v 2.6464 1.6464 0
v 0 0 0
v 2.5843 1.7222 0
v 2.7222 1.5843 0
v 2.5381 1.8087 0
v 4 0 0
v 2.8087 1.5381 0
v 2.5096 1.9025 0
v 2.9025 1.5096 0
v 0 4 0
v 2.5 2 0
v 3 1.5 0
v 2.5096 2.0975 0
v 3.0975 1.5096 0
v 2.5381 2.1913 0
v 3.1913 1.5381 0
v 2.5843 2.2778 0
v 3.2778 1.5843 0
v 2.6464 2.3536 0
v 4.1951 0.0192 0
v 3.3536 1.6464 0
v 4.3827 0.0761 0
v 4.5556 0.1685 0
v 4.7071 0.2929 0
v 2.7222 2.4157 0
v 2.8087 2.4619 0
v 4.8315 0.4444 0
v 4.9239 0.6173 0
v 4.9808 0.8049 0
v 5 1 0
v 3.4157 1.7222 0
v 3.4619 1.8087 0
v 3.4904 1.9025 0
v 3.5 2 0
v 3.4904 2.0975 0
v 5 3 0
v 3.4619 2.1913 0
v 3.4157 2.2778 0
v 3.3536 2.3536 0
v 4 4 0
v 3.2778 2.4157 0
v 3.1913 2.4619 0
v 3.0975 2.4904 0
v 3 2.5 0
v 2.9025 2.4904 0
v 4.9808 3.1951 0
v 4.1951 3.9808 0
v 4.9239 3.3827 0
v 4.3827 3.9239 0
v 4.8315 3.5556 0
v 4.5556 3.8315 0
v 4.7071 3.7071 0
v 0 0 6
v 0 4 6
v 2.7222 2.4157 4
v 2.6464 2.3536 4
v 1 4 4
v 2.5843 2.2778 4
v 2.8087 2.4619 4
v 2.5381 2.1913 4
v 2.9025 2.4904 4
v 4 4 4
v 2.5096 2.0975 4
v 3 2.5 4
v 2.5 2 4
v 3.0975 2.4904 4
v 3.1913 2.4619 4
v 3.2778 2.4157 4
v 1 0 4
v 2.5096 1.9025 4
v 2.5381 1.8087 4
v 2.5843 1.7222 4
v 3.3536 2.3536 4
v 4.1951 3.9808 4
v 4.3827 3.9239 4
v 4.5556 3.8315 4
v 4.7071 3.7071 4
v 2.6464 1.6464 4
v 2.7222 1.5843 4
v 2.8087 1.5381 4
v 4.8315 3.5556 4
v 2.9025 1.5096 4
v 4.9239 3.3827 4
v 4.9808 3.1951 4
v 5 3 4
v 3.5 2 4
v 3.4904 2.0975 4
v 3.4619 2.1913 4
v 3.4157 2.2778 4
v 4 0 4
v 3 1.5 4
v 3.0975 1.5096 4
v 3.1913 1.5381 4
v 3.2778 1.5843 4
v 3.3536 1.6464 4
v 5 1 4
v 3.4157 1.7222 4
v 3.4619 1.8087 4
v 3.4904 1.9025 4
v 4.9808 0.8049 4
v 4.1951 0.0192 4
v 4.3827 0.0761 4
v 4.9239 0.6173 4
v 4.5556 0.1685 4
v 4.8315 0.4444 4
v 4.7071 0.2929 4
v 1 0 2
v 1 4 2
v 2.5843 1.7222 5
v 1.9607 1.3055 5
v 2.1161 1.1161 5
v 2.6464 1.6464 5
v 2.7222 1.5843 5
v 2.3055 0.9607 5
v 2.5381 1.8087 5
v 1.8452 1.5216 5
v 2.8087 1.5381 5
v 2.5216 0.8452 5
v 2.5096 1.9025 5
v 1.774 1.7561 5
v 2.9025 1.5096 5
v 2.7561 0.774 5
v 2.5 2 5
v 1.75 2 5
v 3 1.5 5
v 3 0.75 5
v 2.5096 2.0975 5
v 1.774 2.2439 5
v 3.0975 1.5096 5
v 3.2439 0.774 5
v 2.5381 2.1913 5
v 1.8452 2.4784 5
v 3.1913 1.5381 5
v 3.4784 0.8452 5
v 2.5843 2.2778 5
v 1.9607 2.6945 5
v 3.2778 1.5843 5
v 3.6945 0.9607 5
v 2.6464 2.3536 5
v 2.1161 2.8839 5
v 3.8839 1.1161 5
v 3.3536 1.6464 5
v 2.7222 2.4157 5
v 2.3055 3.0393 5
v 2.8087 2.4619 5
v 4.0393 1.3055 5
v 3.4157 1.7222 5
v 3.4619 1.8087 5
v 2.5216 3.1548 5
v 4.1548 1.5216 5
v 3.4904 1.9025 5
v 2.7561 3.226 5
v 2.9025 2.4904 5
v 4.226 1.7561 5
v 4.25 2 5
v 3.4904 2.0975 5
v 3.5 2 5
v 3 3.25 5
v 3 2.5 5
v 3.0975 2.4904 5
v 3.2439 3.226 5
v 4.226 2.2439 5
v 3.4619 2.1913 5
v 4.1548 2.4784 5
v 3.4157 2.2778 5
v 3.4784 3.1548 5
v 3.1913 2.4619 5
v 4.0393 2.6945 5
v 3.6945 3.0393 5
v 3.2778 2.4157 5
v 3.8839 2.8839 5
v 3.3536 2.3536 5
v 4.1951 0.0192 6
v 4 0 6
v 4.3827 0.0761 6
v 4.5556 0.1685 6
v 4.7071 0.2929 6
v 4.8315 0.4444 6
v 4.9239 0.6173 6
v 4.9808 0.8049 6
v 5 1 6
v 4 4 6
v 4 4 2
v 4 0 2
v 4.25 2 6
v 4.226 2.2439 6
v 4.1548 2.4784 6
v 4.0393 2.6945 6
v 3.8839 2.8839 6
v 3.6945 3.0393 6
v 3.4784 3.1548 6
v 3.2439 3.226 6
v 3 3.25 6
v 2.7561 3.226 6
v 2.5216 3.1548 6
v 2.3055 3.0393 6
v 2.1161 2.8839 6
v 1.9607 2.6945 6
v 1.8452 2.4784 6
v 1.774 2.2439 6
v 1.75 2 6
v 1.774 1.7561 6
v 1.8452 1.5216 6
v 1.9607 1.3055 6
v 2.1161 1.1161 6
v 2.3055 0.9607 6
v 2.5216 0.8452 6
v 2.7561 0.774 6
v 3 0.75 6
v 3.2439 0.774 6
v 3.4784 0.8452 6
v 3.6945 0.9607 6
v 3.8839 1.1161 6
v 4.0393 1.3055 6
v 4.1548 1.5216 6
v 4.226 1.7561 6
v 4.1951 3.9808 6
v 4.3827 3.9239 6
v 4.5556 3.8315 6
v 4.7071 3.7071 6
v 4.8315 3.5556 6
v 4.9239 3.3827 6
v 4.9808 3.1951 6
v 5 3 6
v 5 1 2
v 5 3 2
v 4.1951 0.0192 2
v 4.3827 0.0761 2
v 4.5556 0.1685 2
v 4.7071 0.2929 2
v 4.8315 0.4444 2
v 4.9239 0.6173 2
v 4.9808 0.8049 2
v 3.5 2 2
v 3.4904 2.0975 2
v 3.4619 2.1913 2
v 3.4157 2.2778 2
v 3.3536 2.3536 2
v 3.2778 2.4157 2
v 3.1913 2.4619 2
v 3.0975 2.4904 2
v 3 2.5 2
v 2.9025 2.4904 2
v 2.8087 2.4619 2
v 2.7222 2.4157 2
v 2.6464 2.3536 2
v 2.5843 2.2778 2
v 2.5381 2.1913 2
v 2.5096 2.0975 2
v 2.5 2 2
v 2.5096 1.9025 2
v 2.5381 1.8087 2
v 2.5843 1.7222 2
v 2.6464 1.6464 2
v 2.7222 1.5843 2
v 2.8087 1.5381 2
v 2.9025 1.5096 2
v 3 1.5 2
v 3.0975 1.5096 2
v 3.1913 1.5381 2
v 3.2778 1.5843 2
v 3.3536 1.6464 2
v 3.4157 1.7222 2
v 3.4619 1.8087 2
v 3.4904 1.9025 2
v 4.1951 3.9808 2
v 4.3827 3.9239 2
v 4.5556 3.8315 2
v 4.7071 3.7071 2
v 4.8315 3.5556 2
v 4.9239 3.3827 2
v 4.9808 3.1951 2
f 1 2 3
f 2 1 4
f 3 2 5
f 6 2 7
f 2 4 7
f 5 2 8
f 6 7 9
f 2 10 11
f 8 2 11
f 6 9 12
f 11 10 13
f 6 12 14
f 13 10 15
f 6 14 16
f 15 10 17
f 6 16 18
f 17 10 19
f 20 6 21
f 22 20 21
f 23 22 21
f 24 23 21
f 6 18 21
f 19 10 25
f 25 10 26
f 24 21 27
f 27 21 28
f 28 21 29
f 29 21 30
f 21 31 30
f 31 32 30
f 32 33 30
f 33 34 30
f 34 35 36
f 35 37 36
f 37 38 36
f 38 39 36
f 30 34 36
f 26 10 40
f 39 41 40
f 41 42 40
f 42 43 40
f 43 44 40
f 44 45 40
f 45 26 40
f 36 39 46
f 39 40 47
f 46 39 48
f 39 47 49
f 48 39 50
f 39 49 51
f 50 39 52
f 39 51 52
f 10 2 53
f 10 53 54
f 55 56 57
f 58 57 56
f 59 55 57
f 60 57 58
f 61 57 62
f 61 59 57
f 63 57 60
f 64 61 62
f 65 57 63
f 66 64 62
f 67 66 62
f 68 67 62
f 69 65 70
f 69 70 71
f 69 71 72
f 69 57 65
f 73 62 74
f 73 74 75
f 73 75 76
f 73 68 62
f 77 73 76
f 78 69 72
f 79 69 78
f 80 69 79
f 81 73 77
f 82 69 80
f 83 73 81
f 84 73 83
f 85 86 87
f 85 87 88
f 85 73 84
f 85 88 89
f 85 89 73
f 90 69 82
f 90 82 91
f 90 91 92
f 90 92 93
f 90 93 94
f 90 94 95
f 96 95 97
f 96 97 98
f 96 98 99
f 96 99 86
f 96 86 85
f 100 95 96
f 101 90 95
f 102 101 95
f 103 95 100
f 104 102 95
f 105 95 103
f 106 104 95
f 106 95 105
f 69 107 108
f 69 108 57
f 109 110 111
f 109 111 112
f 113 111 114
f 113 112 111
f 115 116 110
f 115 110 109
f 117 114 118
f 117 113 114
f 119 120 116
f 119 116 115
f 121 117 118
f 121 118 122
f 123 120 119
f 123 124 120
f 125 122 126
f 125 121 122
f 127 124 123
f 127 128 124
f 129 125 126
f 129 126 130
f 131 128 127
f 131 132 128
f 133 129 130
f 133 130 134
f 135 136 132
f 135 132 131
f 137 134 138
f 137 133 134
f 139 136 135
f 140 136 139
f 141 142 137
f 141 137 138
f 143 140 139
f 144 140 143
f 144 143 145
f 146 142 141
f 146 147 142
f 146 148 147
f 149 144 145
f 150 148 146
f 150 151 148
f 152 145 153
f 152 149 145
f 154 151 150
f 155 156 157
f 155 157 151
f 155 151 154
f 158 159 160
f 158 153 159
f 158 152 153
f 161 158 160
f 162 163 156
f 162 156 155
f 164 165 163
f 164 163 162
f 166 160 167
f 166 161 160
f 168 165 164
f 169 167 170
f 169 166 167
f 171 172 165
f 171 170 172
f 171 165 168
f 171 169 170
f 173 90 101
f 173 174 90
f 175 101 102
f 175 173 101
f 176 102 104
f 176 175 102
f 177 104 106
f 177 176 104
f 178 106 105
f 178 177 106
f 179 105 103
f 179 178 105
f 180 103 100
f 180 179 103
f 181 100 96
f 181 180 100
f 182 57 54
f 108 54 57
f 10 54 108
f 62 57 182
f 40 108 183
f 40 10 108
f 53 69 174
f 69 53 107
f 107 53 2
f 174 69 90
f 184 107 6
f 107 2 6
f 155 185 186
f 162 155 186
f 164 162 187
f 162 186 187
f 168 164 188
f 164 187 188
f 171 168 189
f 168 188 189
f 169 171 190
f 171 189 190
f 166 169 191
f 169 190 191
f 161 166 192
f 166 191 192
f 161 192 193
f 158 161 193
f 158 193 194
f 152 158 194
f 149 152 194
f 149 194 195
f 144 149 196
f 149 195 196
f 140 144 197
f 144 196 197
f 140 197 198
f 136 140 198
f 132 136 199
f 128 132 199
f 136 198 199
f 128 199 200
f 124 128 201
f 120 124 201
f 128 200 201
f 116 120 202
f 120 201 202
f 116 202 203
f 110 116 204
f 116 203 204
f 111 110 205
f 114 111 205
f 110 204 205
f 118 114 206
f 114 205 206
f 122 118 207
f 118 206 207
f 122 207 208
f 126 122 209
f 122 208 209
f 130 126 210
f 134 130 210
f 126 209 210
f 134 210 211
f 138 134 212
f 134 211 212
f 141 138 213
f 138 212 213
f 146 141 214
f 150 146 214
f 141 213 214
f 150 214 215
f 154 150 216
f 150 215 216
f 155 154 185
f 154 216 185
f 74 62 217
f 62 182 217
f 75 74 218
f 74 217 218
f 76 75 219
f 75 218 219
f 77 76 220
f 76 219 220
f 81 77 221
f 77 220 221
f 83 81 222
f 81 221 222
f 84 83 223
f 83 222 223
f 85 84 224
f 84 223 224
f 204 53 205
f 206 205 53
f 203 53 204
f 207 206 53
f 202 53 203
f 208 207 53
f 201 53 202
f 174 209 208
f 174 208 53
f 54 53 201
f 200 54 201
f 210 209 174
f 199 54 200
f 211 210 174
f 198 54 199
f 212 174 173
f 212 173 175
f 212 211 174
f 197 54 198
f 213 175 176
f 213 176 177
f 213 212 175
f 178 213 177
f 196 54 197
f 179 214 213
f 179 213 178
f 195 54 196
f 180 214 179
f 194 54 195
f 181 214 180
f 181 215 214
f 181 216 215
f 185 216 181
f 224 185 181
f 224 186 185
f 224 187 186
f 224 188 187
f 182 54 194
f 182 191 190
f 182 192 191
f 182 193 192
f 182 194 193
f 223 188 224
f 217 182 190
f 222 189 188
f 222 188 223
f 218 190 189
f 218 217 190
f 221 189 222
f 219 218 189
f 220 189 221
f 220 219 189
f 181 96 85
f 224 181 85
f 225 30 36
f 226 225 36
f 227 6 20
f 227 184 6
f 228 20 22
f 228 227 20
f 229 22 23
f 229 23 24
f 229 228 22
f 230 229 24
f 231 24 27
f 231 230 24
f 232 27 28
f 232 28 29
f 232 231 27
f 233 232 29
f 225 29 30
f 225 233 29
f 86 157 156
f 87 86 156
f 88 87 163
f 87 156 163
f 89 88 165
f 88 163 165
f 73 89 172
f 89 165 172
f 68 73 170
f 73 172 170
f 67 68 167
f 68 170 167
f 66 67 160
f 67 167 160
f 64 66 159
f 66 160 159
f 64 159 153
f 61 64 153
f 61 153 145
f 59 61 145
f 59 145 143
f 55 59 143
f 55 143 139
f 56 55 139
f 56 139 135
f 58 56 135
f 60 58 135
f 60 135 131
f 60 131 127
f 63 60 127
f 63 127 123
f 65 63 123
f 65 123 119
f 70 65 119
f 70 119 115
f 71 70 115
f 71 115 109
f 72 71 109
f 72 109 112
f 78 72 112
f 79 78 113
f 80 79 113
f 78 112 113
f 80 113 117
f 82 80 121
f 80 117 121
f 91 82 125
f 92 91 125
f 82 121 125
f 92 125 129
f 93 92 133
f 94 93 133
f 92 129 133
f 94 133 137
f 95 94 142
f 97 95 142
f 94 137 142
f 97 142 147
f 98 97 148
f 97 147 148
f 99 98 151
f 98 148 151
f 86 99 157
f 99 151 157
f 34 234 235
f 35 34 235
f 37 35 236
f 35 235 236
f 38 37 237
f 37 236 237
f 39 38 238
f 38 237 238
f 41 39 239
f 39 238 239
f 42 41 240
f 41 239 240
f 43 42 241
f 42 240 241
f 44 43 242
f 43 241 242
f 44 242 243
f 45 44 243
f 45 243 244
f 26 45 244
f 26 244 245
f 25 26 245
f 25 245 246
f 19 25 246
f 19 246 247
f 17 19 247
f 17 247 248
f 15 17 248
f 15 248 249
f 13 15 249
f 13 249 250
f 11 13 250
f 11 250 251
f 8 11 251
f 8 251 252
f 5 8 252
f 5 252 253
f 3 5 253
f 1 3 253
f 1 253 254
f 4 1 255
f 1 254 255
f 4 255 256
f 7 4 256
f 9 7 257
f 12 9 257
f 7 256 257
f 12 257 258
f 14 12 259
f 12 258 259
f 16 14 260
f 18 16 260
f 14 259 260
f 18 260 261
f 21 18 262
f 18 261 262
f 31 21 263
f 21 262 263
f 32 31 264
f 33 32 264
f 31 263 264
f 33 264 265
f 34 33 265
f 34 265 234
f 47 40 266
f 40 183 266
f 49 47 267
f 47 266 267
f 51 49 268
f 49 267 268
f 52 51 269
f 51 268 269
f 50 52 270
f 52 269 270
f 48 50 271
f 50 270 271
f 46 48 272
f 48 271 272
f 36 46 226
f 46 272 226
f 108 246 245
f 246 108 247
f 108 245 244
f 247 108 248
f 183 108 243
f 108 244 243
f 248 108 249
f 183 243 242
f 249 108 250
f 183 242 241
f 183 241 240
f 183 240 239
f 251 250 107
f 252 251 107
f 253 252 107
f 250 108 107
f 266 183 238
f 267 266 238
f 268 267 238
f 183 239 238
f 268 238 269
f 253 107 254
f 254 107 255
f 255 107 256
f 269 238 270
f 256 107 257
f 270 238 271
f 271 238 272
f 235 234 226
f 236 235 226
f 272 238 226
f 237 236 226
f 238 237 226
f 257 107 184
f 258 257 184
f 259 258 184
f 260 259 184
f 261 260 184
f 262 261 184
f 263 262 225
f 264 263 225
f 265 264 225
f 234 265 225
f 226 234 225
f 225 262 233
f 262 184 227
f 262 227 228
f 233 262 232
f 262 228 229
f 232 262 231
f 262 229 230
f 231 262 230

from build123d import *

# Parameters (mm, degrees)
F0_W     = 5
F0_H     = 4
F1_DEPTH = 6
F2_W     = 4
F2_H     = 2
F3_DEPTH = 25
F4_R     = 0.5
F5_DEPTH = 25
F6_R     = 1.25
F6_R_2   = 0.5
F7_DEPTH = 1
F8_R     = 1


with BuildPart() as f1:
    # F0 (on Top) → F1 (new body)
    with BuildSketch(Plane.XY):
        with Locations((2.5, 2)):
            Rectangle(F0_W, F0_H)
    extrude(amount=F1_DEPTH)

    # F2 (on face) → F3 (cut)
    with BuildSketch(Plane.XZ):
        with Locations((3, 3)):
            Rectangle(F2_W, F2_H)
    extrude(amount=-F3_DEPTH, mode=Mode.SUBTRACT)

    # F4 (on face) → F5 (cut)
    with BuildSketch(Plane.XY.offset(6)):
        with Locations((3, 2)):
            Circle(F4_R)
    extrude(amount=-F5_DEPTH, mode=Mode.SUBTRACT)

    # F6 (on face) → F7 (cut)
    with BuildSketch(Plane.XY.offset(6)):
        with Locations((3, 2)):
            Circle(F6_R)
        with Locations((3, 2)):
            Circle(F6_R_2, mode=Mode.SUBTRACT)
    extrude(amount=-F7_DEPTH, mode=Mode.SUBTRACT)

    # F8
    f8_edges = [f1.edges().sort_by_distance(p)[0] for p in [
        (5, 0, 1),
        (5, 0, 5),
        (5, 4, 5),
        (5, 4, 1),
    ]]
    fillet(f8_edges, radius=F8_R)


solid = f1.part
